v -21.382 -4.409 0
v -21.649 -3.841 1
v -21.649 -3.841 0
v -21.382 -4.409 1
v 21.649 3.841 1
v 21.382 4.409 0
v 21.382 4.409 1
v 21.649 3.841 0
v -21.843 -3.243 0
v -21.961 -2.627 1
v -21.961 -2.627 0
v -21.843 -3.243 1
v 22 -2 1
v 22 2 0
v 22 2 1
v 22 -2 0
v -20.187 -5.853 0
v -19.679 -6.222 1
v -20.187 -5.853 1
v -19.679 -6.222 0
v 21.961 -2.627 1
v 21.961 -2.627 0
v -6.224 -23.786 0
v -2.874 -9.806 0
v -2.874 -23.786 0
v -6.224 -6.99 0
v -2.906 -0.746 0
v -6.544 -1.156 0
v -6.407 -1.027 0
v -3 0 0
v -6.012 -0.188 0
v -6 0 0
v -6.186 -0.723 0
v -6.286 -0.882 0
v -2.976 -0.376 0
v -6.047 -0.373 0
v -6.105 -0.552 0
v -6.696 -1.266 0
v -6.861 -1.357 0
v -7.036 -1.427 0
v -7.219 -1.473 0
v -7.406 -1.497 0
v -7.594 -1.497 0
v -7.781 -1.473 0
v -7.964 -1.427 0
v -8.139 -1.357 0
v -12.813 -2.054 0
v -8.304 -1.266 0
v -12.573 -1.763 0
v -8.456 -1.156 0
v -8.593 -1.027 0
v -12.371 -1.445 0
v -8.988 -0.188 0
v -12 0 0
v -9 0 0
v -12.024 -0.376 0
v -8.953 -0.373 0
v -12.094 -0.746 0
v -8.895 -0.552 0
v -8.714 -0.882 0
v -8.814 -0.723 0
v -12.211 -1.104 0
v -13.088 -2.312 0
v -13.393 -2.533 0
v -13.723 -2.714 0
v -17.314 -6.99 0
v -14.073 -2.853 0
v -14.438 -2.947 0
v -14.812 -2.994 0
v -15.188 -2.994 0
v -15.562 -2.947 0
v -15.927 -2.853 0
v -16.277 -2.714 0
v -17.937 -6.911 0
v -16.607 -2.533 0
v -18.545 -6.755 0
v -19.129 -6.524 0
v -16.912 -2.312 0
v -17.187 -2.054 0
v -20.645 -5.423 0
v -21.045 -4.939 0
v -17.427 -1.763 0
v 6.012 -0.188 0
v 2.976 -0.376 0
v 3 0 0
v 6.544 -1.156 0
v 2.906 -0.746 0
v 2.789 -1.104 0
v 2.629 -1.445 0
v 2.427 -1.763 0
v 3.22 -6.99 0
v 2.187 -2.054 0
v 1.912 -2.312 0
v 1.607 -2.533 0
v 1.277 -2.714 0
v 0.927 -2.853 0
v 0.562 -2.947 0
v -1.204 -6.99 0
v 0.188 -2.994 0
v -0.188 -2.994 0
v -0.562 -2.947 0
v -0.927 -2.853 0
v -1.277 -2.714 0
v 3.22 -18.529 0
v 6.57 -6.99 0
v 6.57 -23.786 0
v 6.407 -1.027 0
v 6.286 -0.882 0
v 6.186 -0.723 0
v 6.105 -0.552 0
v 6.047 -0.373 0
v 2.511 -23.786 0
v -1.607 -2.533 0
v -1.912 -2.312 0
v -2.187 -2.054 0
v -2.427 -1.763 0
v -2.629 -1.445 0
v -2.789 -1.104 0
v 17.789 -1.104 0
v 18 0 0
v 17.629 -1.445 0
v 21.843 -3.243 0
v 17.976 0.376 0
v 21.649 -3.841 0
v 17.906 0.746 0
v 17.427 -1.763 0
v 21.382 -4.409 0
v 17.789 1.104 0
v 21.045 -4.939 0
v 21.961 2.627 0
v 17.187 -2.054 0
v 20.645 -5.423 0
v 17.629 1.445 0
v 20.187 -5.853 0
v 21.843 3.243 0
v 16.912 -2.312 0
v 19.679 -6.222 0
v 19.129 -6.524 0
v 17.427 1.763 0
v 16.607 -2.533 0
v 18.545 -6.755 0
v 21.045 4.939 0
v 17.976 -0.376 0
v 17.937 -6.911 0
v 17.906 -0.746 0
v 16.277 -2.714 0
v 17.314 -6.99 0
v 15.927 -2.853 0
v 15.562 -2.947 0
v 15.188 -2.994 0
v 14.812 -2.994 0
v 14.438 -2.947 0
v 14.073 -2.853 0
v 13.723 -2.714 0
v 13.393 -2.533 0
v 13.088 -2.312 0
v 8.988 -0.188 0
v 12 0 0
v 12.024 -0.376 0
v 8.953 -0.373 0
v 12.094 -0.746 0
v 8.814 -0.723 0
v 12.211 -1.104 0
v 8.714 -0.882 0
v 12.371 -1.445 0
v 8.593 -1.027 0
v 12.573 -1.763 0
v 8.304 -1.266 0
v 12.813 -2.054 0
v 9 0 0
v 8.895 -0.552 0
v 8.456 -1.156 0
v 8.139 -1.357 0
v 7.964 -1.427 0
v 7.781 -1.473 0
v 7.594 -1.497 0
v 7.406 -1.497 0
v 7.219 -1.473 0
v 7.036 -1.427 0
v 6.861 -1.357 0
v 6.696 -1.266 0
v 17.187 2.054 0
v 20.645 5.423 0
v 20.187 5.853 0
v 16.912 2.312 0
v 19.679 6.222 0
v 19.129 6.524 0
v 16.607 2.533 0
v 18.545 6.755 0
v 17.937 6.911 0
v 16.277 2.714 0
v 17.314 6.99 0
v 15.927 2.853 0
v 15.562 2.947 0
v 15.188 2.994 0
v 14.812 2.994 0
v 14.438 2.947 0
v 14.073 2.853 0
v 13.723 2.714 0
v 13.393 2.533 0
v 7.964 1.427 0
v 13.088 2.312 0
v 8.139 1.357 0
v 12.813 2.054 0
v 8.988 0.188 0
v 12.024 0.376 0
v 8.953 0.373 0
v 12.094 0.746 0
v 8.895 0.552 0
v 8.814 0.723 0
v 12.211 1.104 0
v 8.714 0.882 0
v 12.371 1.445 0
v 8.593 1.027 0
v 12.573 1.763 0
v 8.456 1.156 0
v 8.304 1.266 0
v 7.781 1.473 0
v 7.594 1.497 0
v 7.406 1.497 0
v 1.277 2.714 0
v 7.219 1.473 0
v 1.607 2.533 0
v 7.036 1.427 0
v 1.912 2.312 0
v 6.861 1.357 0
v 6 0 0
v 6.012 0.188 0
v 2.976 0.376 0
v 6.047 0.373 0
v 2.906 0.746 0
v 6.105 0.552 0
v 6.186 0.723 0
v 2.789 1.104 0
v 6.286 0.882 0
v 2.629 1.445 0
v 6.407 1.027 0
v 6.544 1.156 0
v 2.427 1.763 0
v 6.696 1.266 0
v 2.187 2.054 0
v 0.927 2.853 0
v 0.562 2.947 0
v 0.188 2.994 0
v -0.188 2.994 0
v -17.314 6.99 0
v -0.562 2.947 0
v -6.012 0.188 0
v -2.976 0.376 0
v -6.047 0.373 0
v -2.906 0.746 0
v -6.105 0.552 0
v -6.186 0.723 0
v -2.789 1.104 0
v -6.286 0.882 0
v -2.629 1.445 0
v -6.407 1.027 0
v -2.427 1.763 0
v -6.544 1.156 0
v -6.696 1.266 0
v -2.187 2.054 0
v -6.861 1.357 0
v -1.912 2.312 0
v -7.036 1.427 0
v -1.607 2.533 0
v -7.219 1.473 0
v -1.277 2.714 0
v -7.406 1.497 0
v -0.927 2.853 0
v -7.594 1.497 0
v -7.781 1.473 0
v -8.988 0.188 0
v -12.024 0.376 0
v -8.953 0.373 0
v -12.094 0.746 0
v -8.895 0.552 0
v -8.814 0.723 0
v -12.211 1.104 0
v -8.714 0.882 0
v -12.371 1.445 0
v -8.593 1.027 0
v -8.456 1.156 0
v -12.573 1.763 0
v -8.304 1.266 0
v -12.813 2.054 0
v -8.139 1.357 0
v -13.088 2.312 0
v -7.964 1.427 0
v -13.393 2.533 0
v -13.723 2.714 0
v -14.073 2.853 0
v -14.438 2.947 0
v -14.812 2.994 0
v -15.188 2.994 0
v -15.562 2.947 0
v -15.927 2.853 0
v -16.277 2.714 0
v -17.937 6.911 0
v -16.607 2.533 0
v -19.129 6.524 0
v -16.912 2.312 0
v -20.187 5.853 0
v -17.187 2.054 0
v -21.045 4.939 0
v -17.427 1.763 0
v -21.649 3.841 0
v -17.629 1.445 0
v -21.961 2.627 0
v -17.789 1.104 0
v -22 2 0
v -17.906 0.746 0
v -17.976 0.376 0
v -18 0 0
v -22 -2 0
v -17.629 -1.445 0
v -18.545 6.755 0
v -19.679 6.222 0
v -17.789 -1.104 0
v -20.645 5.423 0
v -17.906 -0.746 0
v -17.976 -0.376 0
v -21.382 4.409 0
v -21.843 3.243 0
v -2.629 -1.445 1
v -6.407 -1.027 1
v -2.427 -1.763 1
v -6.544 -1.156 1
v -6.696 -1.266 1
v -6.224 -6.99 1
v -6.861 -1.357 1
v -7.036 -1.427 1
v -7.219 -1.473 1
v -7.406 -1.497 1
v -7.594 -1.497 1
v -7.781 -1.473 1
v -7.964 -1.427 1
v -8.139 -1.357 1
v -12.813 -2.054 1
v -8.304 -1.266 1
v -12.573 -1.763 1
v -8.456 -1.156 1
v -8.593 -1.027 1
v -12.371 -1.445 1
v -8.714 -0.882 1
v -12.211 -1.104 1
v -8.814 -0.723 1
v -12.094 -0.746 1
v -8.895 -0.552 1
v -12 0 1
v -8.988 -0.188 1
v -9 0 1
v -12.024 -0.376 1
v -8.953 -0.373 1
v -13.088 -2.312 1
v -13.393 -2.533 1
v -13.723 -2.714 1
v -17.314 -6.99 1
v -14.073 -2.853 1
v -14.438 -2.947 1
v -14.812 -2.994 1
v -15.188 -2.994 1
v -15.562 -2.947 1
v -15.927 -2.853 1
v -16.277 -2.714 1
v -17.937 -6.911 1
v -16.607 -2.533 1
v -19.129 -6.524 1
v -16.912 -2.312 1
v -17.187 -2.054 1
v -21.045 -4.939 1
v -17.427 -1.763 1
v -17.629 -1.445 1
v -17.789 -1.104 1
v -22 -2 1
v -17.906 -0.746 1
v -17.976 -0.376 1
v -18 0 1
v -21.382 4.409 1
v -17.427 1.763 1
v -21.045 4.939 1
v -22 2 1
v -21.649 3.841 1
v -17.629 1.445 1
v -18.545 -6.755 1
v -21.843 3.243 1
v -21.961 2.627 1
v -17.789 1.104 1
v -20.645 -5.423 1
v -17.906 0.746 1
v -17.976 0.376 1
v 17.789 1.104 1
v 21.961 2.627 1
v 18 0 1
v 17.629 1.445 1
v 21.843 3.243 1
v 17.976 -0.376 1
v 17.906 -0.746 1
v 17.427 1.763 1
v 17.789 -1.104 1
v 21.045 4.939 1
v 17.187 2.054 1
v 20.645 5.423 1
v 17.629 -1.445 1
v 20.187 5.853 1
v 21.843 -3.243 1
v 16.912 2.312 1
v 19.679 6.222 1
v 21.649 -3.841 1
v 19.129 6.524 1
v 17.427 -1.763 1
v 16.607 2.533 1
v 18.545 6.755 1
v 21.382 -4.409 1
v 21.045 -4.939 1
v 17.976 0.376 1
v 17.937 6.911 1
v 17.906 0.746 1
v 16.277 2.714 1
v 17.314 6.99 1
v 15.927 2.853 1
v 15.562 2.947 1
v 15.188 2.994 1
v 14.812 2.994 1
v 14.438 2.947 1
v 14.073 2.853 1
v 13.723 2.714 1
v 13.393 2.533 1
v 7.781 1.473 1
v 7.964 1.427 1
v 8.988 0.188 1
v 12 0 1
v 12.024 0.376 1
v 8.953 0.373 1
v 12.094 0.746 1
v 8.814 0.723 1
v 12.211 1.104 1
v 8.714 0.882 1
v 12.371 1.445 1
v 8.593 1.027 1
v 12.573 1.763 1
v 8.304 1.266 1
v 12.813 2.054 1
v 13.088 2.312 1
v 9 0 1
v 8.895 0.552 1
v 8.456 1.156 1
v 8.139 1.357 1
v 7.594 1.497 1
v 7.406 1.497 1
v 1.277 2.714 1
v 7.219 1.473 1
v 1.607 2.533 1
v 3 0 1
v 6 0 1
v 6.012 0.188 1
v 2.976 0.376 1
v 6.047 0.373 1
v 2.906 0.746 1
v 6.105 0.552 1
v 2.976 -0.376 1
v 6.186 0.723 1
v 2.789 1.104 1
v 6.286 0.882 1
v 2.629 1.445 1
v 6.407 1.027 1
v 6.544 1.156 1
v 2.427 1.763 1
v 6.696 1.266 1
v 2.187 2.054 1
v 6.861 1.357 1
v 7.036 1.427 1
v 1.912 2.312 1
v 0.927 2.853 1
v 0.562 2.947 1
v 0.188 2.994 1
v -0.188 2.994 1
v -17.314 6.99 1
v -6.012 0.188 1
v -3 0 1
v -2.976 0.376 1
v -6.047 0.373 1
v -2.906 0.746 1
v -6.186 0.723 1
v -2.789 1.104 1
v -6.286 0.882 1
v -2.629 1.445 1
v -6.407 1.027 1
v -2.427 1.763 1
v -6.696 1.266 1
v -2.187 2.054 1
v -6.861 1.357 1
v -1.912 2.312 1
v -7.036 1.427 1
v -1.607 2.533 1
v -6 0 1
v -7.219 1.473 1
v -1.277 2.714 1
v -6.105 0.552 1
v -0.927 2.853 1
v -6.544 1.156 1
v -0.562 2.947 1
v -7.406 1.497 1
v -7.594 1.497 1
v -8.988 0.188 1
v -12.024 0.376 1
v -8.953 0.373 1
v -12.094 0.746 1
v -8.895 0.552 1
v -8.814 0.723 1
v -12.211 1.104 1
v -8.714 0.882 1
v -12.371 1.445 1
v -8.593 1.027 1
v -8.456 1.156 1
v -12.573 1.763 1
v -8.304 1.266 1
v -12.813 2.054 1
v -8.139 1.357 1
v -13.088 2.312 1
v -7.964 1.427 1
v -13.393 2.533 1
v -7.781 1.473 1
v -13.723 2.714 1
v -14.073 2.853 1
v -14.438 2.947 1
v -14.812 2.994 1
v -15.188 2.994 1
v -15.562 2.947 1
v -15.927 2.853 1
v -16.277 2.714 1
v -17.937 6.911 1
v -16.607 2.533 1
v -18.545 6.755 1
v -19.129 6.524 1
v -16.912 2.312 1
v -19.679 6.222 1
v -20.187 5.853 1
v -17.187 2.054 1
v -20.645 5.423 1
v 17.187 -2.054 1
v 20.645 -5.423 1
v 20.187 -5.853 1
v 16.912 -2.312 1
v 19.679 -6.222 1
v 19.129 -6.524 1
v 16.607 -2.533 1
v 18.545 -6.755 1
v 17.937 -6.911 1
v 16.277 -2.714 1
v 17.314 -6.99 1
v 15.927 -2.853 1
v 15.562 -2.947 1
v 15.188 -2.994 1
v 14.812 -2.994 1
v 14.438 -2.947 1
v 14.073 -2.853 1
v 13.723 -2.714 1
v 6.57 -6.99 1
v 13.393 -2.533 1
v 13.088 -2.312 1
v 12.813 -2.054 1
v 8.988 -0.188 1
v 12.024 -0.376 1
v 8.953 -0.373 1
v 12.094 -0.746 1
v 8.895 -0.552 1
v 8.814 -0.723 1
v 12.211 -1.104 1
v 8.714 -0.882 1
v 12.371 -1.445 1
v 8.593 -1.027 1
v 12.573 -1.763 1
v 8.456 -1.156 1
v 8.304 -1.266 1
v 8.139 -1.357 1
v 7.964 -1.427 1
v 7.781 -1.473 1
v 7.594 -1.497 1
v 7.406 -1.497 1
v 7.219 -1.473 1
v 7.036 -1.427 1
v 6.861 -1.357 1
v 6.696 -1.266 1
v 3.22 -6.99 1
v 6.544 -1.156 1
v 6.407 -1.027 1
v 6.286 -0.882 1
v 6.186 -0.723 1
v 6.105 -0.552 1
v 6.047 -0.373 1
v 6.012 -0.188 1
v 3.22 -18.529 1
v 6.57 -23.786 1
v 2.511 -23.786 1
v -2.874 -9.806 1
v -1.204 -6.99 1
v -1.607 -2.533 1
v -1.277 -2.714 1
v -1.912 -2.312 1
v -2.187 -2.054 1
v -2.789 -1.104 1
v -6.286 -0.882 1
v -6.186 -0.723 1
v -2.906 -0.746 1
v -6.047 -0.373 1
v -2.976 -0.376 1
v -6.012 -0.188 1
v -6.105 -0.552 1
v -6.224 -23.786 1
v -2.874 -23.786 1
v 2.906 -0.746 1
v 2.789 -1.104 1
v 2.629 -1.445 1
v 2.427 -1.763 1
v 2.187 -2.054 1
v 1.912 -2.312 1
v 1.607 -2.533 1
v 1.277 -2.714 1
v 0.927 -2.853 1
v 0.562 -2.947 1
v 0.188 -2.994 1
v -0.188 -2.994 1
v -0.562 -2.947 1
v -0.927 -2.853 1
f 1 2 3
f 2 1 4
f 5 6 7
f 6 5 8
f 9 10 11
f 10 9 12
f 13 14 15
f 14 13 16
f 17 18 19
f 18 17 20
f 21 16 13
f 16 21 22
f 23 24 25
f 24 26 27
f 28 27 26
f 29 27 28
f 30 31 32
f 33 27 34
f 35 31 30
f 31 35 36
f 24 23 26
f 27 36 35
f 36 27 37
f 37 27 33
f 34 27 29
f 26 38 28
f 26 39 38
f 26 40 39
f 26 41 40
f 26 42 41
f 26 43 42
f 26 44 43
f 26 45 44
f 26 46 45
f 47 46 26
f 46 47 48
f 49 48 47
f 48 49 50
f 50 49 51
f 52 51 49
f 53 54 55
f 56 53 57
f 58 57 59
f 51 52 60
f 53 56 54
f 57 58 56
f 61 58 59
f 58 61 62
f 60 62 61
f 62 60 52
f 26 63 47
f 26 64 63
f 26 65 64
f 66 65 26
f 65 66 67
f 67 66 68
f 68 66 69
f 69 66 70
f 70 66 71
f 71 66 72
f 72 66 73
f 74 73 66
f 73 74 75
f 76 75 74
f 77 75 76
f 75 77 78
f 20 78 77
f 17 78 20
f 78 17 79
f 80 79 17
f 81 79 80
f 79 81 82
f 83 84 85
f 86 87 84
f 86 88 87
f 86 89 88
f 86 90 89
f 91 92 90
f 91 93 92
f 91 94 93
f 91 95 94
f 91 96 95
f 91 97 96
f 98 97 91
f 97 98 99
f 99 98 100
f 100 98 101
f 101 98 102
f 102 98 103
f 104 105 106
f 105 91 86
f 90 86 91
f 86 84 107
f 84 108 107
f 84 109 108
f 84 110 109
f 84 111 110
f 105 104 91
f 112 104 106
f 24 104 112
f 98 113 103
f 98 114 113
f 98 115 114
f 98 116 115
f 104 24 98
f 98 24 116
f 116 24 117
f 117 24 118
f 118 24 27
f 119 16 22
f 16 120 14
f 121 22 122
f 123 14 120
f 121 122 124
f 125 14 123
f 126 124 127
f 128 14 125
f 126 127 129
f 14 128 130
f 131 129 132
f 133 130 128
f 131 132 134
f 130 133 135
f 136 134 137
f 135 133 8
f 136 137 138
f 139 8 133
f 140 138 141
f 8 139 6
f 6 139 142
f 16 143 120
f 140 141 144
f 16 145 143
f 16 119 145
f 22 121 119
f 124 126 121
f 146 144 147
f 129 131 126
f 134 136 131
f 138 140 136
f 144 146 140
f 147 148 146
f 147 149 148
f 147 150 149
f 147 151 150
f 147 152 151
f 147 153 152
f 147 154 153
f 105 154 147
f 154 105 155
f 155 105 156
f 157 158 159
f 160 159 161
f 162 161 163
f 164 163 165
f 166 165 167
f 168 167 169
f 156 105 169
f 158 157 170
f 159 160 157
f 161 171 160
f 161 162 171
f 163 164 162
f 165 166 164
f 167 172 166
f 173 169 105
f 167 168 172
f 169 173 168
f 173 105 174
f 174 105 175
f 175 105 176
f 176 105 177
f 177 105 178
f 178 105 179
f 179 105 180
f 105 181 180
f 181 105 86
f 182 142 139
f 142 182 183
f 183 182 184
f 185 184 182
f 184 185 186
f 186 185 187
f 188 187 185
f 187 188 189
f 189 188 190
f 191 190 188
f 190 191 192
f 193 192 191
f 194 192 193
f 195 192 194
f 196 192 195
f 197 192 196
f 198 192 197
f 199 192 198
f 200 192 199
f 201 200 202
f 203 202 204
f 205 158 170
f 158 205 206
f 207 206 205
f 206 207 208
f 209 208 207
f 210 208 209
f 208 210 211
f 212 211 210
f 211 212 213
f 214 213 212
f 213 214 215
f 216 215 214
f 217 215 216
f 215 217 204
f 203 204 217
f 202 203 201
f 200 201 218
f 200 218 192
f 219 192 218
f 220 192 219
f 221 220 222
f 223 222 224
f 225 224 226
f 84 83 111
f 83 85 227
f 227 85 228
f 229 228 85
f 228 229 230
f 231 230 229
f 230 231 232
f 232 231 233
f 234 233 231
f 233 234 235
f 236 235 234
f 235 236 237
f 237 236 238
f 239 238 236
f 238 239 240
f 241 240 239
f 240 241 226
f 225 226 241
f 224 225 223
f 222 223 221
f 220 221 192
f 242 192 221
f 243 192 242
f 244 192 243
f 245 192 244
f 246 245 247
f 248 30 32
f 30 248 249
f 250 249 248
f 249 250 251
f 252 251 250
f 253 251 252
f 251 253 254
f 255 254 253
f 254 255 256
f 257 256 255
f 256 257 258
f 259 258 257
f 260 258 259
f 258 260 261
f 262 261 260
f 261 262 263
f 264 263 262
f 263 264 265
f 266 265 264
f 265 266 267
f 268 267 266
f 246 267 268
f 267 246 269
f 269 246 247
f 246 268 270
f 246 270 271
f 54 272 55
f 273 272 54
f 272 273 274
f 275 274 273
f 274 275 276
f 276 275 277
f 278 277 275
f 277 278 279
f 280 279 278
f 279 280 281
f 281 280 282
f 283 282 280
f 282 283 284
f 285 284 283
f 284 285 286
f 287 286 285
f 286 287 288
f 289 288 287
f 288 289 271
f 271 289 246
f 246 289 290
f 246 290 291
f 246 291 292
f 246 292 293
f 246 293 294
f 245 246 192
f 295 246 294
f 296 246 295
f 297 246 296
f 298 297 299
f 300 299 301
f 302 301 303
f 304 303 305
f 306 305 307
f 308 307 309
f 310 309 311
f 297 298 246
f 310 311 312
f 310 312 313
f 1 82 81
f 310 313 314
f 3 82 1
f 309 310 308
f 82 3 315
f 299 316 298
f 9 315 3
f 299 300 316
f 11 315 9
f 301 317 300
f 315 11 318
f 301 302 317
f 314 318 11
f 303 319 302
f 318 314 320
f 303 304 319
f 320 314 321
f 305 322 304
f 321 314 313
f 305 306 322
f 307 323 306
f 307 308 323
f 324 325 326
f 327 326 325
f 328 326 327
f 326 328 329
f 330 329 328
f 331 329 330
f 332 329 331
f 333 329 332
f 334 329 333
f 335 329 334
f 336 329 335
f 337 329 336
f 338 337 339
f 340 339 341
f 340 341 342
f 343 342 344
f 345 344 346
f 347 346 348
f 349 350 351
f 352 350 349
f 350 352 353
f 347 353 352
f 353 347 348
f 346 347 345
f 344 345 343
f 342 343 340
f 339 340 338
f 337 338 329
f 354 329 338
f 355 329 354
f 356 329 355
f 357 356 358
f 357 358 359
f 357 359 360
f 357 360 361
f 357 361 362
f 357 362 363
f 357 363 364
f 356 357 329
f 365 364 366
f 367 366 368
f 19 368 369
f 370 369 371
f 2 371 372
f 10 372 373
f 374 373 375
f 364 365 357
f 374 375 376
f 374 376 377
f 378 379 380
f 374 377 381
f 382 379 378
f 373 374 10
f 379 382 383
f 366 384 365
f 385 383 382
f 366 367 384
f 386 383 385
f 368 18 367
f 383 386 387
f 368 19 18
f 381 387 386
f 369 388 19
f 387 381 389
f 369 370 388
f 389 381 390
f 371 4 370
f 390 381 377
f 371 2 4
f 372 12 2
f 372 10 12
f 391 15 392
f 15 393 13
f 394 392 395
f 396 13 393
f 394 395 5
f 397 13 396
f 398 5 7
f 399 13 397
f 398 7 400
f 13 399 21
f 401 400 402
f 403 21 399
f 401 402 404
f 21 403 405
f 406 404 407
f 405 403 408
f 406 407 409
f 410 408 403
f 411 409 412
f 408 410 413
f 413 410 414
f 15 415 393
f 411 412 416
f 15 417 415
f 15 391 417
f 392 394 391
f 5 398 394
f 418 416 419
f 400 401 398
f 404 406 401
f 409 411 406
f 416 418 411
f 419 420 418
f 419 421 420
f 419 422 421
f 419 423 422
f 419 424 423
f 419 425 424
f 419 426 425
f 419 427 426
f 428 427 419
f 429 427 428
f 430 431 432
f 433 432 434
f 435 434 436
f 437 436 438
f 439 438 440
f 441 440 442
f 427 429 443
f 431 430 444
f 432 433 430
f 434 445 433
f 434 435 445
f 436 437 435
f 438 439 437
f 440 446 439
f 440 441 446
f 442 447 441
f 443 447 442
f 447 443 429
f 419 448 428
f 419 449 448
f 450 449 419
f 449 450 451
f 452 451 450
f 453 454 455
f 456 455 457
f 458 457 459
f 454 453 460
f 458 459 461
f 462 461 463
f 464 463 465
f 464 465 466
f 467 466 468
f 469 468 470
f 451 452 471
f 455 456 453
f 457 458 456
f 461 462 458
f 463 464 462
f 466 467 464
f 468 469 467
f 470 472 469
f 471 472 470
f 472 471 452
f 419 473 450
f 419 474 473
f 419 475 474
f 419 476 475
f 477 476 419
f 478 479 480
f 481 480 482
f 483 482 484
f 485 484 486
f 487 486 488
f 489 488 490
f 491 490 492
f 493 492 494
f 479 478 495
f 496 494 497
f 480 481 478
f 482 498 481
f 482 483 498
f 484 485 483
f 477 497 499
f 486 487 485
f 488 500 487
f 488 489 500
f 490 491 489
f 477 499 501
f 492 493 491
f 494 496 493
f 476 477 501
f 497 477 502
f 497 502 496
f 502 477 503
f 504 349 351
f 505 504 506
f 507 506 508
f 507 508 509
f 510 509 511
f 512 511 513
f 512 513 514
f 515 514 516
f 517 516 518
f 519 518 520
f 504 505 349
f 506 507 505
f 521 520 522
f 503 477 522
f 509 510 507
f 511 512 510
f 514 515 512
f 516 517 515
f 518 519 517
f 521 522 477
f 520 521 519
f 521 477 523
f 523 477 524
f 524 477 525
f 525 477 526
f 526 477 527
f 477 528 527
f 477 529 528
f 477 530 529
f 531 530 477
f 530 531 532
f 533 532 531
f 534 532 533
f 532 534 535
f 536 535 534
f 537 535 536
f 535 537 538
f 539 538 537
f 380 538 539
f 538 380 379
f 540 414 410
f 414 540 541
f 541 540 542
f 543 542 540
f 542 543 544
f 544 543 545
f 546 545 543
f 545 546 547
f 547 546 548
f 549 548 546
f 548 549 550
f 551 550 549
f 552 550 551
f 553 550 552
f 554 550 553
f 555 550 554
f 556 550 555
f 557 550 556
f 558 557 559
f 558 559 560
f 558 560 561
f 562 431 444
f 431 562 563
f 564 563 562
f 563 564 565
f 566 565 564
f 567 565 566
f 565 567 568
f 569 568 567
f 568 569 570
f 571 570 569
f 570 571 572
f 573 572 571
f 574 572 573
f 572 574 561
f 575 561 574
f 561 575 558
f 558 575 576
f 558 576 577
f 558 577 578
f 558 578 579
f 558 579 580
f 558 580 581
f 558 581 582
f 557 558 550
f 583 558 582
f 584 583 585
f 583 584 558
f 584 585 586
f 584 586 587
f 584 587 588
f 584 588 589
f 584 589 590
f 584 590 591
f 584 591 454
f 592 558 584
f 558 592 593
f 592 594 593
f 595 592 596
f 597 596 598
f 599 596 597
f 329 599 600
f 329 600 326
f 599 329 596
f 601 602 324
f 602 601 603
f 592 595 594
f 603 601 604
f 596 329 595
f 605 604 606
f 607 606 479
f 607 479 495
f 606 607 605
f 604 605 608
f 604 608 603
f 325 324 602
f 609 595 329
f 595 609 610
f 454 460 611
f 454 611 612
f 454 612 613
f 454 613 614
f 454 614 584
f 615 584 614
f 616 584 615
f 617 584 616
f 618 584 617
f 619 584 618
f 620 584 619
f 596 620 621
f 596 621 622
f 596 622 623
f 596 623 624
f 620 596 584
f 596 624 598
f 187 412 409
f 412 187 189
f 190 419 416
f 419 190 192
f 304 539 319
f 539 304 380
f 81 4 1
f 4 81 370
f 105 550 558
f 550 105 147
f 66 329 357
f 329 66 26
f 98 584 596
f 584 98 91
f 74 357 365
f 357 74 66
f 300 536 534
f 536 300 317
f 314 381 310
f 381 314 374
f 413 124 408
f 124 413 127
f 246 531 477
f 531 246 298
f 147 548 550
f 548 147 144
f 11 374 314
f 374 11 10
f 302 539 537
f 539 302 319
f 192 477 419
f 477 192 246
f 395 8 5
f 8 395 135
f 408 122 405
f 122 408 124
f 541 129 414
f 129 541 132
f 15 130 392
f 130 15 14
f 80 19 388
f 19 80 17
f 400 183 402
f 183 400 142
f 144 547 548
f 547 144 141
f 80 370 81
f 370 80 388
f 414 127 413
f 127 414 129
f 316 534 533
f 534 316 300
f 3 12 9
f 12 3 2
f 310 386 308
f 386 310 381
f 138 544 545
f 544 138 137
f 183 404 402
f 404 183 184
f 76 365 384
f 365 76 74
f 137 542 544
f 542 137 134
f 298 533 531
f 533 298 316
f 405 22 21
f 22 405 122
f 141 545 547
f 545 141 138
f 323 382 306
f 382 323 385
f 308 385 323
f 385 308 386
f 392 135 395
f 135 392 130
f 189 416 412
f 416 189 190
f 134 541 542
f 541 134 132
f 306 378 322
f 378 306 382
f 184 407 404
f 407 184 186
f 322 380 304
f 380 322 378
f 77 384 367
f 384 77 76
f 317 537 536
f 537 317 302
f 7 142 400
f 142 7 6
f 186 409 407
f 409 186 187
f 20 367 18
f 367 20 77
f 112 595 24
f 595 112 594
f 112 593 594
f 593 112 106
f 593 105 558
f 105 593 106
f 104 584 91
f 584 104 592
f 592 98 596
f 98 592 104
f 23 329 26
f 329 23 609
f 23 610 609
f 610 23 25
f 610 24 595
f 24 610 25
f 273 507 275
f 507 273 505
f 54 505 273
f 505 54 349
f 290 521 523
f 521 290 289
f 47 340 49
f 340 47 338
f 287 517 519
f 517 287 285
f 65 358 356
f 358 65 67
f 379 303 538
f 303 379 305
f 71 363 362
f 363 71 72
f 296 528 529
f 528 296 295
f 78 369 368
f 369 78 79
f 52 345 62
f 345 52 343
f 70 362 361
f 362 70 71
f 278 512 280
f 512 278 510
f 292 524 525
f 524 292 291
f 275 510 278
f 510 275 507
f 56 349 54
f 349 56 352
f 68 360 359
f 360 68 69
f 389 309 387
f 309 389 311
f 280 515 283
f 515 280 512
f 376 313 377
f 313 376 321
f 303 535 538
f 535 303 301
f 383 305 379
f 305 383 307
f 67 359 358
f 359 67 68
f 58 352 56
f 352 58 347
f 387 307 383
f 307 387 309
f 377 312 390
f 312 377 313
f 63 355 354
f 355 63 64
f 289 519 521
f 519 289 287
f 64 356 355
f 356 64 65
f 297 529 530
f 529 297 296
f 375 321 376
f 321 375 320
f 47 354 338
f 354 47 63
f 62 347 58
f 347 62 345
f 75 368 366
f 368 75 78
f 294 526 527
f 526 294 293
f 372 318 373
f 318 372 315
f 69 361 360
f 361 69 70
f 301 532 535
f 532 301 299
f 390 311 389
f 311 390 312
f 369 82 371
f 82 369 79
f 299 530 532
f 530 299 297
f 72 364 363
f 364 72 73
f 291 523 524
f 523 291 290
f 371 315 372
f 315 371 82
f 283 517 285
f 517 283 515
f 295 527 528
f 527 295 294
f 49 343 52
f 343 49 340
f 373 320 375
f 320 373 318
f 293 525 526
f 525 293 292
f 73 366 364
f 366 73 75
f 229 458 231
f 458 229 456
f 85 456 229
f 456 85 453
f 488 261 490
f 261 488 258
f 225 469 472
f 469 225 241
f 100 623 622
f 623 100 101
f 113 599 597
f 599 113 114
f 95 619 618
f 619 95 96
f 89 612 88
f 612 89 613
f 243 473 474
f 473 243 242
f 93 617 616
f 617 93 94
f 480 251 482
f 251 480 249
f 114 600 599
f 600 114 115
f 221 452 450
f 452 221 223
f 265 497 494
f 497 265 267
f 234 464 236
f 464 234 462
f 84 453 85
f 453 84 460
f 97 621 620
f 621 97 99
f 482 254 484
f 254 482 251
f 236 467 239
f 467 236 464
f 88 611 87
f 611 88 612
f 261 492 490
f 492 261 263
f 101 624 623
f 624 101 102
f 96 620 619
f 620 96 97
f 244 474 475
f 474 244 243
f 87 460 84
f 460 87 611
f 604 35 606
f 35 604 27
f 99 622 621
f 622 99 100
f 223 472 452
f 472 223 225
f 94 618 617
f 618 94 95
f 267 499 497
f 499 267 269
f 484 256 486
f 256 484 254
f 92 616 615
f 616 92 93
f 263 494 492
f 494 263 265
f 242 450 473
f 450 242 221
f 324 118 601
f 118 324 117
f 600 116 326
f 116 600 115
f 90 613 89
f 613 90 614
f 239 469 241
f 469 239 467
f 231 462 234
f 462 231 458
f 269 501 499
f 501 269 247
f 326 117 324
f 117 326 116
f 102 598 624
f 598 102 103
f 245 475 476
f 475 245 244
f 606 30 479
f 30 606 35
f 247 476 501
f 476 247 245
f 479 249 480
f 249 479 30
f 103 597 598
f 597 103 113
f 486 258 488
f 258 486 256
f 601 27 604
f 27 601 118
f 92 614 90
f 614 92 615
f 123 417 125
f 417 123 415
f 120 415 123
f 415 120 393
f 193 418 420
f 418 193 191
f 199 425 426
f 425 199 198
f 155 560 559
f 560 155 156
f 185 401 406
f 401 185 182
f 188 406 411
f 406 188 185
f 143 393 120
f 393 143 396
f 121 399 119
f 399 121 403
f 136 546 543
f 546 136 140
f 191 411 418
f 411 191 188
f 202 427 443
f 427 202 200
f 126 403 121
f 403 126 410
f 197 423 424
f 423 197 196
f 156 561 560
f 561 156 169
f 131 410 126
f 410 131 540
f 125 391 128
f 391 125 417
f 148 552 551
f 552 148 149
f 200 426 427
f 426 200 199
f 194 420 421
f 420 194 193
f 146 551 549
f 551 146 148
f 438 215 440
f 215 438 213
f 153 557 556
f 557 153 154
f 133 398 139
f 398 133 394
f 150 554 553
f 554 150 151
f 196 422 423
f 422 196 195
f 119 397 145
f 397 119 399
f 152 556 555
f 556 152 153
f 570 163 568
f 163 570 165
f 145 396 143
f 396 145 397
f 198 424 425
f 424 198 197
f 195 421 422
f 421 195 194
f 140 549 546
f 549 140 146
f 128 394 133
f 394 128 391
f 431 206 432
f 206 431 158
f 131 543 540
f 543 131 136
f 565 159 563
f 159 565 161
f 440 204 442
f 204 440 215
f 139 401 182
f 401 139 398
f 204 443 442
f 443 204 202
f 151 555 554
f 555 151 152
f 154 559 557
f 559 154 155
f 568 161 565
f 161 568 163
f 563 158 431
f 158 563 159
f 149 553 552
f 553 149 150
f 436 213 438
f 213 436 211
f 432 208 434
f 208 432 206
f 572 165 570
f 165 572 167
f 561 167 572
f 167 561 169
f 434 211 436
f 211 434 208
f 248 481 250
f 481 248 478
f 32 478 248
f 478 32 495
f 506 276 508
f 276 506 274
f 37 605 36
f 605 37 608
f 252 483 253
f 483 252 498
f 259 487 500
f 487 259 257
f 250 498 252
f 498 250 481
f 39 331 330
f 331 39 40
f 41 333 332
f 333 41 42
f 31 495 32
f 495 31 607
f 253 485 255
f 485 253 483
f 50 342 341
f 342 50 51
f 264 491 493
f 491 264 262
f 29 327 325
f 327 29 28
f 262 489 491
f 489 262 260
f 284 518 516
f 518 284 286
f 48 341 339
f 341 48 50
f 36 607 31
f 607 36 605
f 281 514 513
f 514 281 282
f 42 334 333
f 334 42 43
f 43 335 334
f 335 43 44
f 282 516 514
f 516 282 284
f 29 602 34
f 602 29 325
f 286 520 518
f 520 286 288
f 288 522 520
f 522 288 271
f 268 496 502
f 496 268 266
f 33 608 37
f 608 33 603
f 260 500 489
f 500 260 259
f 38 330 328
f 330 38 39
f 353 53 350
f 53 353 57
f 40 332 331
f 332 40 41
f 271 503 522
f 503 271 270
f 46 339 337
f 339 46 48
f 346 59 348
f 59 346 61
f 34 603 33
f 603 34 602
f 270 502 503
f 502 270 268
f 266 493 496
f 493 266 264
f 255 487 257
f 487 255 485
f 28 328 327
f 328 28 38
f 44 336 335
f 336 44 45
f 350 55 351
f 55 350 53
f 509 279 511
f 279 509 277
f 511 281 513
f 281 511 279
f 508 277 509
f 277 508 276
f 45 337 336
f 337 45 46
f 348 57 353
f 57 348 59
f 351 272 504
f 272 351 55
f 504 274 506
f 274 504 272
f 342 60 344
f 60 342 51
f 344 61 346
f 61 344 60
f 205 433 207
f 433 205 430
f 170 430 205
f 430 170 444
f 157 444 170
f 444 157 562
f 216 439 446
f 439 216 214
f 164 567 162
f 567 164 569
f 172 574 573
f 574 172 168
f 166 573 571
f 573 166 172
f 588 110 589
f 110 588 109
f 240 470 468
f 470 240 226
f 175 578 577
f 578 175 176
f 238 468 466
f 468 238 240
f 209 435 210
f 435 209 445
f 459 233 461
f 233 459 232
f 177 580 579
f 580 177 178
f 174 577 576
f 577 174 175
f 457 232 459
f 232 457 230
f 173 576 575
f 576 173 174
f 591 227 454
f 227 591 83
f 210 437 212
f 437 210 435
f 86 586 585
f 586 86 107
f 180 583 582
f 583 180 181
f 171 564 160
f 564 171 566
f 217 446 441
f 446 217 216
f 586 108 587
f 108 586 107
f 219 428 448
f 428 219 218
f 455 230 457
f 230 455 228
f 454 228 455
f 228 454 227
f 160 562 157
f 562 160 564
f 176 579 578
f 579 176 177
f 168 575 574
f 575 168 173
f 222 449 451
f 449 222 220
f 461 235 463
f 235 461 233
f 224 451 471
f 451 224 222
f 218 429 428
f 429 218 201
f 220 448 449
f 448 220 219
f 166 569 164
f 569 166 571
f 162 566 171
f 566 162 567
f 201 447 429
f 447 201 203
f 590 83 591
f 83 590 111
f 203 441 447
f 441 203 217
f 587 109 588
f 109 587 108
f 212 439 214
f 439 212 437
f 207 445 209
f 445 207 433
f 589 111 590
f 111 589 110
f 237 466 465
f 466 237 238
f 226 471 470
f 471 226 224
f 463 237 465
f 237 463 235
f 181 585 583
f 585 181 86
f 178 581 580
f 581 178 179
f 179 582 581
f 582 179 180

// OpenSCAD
$fn = 50;


difference() {
	union() {
		hull() {
			translate(v = [-17.0000000000, 2.0000000000, 0]) {
				cylinder(h = 1, r = 5);
			}
			translate(v = [17.0000000000, 2.0000000000, 0]) {
				cylinder(h = 1, r = 5);
			}
			translate(v = [-17.0000000000, -2.0000000000, 0]) {
				cylinder(h = 1, r = 5);
			}
			translate(v = [17.0000000000, -2.0000000000, 0]) {
				cylinder(h = 1, r = 5);
			}
		}
		translate(v = [0, -5, 0]) {
			linear_extrude(height = 1) {
				text(font = "DejaVu Sans Mono:style=Bold", halign = "center", size = 19.0000000000, text = "N", valign = "top");
			}
		}
	}
	union() {
		translate(v = [-15.0000000000, 0.0000000000, 0]) {
			translate(v = [0, 0, -100]) {
				cylinder(h = 200, r = 3.0000000000);
			}
		}
		translate(v = [0, 0, -100]) {
			cylinder(h = 200, r = 3.0000000000);
		}
		translate(v = [15.0000000000, 0.0000000000, 0]) {
			translate(v = [0, 0, -100]) {
				cylinder(h = 200, r = 3.0000000000);
			}
		}
		translate(v = [-15.0000000000, 0.0000000000, 0]) {
			translate(v = [0, 0, -100]) {
				cylinder(h = 200, r = 1.5000000000);
			}
		}
		translate(v = [-7.5000000000, 0.0000000000, 0]) {
			translate(v = [0, 0, -100]) {
				cylinder(h = 200, r = 1.5000000000);
			}
		}
		translate(v = [0, 0, -100]) {
			cylinder(h = 200, r = 1.5000000000);
		}
		translate(v = [7.5000000000, 0.0000000000, 0]) {
			translate(v = [0, 0, -100]) {
				cylinder(h = 200, r = 1.5000000000);
			}
		}
		translate(v = [15.0000000000, 0.0000000000, 0]) {
			translate(v = [0, 0, -100]) {
				cylinder(h = 200, r = 1.5000000000);
			}
		}
	}
}
